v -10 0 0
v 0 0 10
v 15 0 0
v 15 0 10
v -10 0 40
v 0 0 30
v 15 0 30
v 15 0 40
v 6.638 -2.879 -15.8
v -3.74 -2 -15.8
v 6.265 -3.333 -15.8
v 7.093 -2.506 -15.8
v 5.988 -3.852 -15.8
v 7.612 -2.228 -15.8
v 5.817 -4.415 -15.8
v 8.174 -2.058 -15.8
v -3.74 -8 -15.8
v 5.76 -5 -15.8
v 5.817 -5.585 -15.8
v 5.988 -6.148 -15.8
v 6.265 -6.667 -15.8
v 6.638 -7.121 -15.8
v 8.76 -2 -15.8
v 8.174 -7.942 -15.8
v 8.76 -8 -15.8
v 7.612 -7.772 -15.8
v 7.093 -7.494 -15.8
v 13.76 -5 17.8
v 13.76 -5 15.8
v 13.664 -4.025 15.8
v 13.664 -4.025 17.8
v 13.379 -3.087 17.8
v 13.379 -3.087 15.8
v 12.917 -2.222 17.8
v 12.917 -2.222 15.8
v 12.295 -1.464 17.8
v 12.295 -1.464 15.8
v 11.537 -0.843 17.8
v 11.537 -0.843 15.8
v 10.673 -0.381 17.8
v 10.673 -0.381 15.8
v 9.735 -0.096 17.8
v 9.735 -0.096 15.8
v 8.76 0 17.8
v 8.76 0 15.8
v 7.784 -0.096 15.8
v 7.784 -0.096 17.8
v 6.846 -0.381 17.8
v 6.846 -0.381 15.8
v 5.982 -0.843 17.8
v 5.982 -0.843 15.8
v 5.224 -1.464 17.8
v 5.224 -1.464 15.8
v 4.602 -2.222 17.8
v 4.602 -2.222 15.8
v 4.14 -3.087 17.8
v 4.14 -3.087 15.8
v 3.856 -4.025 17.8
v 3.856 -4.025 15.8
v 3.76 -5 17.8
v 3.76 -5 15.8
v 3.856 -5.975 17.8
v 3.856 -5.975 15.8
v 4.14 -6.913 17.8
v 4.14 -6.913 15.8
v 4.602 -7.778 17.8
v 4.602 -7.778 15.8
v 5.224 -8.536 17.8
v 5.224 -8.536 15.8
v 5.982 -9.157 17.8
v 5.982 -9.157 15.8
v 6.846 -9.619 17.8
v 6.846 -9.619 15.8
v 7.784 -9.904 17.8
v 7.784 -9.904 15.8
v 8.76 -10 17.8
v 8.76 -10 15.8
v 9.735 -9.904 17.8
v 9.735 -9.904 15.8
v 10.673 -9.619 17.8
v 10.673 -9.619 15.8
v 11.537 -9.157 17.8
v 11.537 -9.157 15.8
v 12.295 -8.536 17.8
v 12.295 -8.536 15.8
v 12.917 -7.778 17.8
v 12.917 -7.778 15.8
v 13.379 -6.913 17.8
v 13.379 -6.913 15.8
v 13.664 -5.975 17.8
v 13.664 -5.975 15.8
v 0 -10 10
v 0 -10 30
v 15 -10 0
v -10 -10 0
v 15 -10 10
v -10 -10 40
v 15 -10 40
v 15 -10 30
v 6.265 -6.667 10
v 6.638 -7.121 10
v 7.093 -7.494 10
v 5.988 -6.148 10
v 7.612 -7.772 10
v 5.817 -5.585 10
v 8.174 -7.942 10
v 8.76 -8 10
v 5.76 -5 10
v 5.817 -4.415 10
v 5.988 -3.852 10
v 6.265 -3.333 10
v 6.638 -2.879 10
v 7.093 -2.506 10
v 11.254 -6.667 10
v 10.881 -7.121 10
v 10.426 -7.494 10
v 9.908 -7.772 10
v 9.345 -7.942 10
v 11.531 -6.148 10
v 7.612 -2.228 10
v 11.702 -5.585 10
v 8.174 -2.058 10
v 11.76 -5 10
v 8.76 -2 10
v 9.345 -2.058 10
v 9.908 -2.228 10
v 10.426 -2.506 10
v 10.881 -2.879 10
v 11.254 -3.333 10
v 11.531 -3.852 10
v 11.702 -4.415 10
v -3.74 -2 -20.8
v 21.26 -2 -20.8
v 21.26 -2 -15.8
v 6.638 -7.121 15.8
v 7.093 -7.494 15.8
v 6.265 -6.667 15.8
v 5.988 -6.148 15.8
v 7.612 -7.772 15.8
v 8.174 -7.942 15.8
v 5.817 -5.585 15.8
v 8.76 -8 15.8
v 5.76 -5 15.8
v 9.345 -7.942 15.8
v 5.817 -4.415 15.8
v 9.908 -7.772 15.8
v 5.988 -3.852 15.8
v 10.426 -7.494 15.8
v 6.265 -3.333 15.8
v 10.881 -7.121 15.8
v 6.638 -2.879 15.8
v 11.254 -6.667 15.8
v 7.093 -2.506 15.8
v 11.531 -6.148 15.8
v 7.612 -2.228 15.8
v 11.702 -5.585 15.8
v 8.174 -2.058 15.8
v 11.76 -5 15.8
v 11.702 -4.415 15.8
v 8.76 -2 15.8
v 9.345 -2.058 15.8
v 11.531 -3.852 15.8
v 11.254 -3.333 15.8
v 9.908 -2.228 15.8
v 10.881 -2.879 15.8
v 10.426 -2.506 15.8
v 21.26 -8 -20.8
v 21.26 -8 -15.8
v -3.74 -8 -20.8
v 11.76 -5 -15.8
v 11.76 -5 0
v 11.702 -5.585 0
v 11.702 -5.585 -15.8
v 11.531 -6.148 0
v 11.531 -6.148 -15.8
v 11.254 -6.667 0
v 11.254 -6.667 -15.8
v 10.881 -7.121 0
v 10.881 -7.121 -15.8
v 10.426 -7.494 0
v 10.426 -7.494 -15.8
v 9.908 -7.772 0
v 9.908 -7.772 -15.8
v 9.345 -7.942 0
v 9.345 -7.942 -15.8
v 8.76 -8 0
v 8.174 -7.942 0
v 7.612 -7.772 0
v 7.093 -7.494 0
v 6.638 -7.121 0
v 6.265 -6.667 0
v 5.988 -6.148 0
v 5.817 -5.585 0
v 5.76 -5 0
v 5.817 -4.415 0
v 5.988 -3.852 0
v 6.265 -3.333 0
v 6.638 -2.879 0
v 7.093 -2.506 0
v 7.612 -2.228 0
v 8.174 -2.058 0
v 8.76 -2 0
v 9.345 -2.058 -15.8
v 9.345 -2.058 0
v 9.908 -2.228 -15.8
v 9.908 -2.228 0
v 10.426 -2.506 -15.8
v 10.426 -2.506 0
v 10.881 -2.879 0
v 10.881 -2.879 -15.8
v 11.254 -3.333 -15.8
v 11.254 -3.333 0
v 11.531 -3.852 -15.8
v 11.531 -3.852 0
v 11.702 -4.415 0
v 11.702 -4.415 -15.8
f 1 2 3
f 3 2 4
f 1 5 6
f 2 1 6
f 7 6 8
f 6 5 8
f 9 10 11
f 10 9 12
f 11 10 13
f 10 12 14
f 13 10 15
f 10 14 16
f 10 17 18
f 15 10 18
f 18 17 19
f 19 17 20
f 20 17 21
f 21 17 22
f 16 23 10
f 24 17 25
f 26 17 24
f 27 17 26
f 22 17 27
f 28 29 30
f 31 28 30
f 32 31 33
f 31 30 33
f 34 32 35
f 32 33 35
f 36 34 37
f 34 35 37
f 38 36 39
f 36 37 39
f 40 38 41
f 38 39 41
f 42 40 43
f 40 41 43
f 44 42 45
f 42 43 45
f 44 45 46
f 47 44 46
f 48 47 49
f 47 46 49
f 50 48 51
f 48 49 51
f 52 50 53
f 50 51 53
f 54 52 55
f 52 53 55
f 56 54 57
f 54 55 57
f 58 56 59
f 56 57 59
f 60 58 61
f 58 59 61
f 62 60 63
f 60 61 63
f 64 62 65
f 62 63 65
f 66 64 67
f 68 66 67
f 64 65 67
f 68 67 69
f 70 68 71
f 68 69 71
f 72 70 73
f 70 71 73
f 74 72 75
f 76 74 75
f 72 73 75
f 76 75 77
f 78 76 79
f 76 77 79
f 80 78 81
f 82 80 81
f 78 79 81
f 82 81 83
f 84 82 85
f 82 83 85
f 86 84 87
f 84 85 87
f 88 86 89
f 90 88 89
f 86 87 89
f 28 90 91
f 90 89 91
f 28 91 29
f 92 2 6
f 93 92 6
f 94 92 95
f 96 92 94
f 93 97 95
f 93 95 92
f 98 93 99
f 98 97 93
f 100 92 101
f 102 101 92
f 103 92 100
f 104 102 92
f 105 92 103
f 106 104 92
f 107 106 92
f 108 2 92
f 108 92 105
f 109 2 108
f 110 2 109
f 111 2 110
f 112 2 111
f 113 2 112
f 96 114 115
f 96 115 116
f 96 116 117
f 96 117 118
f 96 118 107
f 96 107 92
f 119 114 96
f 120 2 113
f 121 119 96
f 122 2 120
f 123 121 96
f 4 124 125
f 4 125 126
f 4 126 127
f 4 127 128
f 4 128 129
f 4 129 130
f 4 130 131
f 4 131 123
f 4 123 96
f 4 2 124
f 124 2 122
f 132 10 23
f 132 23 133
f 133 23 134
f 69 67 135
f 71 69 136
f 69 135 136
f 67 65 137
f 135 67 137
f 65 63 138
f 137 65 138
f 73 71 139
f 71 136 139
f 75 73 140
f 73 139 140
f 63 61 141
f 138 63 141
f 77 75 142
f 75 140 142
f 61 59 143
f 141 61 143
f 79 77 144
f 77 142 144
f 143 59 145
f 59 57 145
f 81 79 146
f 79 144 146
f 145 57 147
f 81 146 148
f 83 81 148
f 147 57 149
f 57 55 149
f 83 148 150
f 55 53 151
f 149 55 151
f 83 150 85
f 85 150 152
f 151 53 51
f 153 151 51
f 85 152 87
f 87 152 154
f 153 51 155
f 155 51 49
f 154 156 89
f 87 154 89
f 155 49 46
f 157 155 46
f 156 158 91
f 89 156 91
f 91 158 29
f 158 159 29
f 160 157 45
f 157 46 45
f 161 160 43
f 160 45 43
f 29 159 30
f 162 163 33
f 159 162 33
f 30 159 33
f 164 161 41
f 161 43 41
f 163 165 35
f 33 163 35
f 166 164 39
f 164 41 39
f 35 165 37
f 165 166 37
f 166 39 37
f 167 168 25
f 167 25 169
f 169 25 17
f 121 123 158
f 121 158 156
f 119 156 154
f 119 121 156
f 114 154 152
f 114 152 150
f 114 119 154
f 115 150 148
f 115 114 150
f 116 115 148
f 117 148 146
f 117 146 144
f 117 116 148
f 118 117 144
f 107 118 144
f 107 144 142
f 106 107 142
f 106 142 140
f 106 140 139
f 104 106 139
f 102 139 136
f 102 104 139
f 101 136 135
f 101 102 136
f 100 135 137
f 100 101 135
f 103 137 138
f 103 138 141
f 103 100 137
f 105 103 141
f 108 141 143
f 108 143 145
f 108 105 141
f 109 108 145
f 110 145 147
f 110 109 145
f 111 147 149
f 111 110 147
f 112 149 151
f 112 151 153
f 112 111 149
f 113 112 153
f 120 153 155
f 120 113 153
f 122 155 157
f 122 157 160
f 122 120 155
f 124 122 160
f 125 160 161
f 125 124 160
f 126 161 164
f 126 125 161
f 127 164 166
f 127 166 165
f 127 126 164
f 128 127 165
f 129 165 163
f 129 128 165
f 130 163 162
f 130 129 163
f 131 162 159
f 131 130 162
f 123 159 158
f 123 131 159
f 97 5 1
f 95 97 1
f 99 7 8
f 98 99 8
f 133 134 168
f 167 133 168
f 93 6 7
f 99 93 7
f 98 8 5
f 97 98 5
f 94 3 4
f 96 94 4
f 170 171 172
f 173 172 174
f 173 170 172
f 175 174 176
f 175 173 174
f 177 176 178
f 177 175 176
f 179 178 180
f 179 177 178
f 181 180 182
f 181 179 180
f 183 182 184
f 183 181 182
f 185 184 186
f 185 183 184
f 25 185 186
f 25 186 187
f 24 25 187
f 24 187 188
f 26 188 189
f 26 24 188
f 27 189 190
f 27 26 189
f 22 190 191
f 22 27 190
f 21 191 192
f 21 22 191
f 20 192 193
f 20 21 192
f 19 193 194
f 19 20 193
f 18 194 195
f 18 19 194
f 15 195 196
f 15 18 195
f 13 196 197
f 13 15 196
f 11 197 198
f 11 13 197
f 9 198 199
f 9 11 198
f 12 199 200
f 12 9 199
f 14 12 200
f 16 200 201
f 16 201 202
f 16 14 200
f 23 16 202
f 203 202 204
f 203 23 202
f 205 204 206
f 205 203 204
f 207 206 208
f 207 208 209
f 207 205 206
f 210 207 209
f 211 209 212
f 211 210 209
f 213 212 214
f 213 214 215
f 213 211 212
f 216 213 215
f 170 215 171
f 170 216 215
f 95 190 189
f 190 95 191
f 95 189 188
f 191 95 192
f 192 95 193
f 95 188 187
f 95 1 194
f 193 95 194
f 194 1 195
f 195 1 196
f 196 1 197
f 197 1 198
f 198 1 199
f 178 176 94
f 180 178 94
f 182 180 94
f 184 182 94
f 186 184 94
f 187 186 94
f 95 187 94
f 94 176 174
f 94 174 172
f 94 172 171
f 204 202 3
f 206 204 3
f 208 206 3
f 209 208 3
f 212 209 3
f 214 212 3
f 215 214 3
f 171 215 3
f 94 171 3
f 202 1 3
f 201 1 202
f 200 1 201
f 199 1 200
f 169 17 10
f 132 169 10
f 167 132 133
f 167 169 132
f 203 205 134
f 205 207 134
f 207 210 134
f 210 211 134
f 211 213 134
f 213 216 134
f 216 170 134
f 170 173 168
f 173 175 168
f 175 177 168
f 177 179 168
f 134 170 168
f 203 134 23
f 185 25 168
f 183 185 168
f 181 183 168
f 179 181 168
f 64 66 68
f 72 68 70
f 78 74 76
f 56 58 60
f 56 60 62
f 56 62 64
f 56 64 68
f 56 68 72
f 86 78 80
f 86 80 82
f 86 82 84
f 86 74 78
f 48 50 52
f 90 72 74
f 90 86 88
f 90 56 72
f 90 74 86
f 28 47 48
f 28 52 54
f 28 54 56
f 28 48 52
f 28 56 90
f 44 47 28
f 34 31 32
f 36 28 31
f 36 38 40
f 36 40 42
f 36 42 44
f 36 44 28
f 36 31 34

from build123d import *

# Parameters (mm, degrees)
F0_W     = 15
F0_H     = 10
F1_DEPTH = 10
F2_R     = 3
F3_DEPTH = 15.8
F5_DEPTH = 5
F6_R     = 5
F6_R_2   = 3
F7_DEPTH = 2


with BuildPart() as f1:
    # F0 (on Front) → F1 (new body)
    with BuildSketch(Plane.XZ):
        Polygon((-10, 0), (0, 0), (0, 10), (0, 30), (0, 40), (-10, 40), align=None)
        with Locations((7.5, 5)):
            Rectangle(F0_W, F0_H)
        with Locations((7.5, 35)):
            Rectangle(F0_W, F0_H)
    extrude(amount=F1_DEPTH)

    # F2 (on face) → F3 (join, symmetric)
    with BuildSketch(Plane(origin=(0, 0, 0), x_dir=(1, 0, 0), z_dir=(0, 0, -1))):
        with Locations((8.7596364319, 5)):
            Circle(F2_R)
    extrude(amount=F3_DEPTH, both=True)

    # F4 (on face) → F5 (join)
    with BuildSketch(Plane(origin=(0, 0, -15.8), x_dir=(1, 0, 0), z_dir=(0, 0, -1))):
        with BuildLine():
            Line((-3.7403635681, 2), (8.7596364319, 2))
            ThreePointArc((8.7596364319, 2), (5.7596364319, 5), (8.7596364319, 8))
            Line((8.7596364319, 8), (-3.7403635681, 8))
            Line((-3.7403635681, 8), (-3.7403635681, 2))
        make_face()
        with BuildLine():
            Line((8.7596364319, 2), (21.2596364319, 2))
            Line((21.2596364319, 2), (21.2596364319, 8))
            Line((21.2596364319, 8), (8.7596364319, 8))
            ThreePointArc((8.7596364319, 8), (10.8809567755, 7.1213203436), (11.7596364319, 5))
            ThreePointArc((11.7596364319, 5), (10.8809567755, 2.8786796564), (8.7596364319, 2))
        make_face()
        with BuildLine():
            ThreePointArc((8.7596364319, 8), (5.7596364319, 5), (8.7596364319, 2))
            ThreePointArc((8.7596364319, 2), (10.8809567755, 2.8786796564), (11.7596364319, 5))
            ThreePointArc((11.7596364319, 5), (10.8809567755, 7.1213203436), (8.7596364319, 8))
        make_face()
    extrude(amount=F5_DEPTH)

    # F6 (on face) → F7 (join)
    with BuildSketch(Plane.XY.offset(15.8)):
        with Locations((8.7596364319, -5)):
            Circle(F6_R)
        with Locations((8.7596364319, -5)):
            Circle(F6_R_2, mode=Mode.SUBTRACT)
        with Locations((8.7596364319, -5)):
            Circle(F6_R_2)
    extrude(amount=F7_DEPTH)


solid = f1.part
